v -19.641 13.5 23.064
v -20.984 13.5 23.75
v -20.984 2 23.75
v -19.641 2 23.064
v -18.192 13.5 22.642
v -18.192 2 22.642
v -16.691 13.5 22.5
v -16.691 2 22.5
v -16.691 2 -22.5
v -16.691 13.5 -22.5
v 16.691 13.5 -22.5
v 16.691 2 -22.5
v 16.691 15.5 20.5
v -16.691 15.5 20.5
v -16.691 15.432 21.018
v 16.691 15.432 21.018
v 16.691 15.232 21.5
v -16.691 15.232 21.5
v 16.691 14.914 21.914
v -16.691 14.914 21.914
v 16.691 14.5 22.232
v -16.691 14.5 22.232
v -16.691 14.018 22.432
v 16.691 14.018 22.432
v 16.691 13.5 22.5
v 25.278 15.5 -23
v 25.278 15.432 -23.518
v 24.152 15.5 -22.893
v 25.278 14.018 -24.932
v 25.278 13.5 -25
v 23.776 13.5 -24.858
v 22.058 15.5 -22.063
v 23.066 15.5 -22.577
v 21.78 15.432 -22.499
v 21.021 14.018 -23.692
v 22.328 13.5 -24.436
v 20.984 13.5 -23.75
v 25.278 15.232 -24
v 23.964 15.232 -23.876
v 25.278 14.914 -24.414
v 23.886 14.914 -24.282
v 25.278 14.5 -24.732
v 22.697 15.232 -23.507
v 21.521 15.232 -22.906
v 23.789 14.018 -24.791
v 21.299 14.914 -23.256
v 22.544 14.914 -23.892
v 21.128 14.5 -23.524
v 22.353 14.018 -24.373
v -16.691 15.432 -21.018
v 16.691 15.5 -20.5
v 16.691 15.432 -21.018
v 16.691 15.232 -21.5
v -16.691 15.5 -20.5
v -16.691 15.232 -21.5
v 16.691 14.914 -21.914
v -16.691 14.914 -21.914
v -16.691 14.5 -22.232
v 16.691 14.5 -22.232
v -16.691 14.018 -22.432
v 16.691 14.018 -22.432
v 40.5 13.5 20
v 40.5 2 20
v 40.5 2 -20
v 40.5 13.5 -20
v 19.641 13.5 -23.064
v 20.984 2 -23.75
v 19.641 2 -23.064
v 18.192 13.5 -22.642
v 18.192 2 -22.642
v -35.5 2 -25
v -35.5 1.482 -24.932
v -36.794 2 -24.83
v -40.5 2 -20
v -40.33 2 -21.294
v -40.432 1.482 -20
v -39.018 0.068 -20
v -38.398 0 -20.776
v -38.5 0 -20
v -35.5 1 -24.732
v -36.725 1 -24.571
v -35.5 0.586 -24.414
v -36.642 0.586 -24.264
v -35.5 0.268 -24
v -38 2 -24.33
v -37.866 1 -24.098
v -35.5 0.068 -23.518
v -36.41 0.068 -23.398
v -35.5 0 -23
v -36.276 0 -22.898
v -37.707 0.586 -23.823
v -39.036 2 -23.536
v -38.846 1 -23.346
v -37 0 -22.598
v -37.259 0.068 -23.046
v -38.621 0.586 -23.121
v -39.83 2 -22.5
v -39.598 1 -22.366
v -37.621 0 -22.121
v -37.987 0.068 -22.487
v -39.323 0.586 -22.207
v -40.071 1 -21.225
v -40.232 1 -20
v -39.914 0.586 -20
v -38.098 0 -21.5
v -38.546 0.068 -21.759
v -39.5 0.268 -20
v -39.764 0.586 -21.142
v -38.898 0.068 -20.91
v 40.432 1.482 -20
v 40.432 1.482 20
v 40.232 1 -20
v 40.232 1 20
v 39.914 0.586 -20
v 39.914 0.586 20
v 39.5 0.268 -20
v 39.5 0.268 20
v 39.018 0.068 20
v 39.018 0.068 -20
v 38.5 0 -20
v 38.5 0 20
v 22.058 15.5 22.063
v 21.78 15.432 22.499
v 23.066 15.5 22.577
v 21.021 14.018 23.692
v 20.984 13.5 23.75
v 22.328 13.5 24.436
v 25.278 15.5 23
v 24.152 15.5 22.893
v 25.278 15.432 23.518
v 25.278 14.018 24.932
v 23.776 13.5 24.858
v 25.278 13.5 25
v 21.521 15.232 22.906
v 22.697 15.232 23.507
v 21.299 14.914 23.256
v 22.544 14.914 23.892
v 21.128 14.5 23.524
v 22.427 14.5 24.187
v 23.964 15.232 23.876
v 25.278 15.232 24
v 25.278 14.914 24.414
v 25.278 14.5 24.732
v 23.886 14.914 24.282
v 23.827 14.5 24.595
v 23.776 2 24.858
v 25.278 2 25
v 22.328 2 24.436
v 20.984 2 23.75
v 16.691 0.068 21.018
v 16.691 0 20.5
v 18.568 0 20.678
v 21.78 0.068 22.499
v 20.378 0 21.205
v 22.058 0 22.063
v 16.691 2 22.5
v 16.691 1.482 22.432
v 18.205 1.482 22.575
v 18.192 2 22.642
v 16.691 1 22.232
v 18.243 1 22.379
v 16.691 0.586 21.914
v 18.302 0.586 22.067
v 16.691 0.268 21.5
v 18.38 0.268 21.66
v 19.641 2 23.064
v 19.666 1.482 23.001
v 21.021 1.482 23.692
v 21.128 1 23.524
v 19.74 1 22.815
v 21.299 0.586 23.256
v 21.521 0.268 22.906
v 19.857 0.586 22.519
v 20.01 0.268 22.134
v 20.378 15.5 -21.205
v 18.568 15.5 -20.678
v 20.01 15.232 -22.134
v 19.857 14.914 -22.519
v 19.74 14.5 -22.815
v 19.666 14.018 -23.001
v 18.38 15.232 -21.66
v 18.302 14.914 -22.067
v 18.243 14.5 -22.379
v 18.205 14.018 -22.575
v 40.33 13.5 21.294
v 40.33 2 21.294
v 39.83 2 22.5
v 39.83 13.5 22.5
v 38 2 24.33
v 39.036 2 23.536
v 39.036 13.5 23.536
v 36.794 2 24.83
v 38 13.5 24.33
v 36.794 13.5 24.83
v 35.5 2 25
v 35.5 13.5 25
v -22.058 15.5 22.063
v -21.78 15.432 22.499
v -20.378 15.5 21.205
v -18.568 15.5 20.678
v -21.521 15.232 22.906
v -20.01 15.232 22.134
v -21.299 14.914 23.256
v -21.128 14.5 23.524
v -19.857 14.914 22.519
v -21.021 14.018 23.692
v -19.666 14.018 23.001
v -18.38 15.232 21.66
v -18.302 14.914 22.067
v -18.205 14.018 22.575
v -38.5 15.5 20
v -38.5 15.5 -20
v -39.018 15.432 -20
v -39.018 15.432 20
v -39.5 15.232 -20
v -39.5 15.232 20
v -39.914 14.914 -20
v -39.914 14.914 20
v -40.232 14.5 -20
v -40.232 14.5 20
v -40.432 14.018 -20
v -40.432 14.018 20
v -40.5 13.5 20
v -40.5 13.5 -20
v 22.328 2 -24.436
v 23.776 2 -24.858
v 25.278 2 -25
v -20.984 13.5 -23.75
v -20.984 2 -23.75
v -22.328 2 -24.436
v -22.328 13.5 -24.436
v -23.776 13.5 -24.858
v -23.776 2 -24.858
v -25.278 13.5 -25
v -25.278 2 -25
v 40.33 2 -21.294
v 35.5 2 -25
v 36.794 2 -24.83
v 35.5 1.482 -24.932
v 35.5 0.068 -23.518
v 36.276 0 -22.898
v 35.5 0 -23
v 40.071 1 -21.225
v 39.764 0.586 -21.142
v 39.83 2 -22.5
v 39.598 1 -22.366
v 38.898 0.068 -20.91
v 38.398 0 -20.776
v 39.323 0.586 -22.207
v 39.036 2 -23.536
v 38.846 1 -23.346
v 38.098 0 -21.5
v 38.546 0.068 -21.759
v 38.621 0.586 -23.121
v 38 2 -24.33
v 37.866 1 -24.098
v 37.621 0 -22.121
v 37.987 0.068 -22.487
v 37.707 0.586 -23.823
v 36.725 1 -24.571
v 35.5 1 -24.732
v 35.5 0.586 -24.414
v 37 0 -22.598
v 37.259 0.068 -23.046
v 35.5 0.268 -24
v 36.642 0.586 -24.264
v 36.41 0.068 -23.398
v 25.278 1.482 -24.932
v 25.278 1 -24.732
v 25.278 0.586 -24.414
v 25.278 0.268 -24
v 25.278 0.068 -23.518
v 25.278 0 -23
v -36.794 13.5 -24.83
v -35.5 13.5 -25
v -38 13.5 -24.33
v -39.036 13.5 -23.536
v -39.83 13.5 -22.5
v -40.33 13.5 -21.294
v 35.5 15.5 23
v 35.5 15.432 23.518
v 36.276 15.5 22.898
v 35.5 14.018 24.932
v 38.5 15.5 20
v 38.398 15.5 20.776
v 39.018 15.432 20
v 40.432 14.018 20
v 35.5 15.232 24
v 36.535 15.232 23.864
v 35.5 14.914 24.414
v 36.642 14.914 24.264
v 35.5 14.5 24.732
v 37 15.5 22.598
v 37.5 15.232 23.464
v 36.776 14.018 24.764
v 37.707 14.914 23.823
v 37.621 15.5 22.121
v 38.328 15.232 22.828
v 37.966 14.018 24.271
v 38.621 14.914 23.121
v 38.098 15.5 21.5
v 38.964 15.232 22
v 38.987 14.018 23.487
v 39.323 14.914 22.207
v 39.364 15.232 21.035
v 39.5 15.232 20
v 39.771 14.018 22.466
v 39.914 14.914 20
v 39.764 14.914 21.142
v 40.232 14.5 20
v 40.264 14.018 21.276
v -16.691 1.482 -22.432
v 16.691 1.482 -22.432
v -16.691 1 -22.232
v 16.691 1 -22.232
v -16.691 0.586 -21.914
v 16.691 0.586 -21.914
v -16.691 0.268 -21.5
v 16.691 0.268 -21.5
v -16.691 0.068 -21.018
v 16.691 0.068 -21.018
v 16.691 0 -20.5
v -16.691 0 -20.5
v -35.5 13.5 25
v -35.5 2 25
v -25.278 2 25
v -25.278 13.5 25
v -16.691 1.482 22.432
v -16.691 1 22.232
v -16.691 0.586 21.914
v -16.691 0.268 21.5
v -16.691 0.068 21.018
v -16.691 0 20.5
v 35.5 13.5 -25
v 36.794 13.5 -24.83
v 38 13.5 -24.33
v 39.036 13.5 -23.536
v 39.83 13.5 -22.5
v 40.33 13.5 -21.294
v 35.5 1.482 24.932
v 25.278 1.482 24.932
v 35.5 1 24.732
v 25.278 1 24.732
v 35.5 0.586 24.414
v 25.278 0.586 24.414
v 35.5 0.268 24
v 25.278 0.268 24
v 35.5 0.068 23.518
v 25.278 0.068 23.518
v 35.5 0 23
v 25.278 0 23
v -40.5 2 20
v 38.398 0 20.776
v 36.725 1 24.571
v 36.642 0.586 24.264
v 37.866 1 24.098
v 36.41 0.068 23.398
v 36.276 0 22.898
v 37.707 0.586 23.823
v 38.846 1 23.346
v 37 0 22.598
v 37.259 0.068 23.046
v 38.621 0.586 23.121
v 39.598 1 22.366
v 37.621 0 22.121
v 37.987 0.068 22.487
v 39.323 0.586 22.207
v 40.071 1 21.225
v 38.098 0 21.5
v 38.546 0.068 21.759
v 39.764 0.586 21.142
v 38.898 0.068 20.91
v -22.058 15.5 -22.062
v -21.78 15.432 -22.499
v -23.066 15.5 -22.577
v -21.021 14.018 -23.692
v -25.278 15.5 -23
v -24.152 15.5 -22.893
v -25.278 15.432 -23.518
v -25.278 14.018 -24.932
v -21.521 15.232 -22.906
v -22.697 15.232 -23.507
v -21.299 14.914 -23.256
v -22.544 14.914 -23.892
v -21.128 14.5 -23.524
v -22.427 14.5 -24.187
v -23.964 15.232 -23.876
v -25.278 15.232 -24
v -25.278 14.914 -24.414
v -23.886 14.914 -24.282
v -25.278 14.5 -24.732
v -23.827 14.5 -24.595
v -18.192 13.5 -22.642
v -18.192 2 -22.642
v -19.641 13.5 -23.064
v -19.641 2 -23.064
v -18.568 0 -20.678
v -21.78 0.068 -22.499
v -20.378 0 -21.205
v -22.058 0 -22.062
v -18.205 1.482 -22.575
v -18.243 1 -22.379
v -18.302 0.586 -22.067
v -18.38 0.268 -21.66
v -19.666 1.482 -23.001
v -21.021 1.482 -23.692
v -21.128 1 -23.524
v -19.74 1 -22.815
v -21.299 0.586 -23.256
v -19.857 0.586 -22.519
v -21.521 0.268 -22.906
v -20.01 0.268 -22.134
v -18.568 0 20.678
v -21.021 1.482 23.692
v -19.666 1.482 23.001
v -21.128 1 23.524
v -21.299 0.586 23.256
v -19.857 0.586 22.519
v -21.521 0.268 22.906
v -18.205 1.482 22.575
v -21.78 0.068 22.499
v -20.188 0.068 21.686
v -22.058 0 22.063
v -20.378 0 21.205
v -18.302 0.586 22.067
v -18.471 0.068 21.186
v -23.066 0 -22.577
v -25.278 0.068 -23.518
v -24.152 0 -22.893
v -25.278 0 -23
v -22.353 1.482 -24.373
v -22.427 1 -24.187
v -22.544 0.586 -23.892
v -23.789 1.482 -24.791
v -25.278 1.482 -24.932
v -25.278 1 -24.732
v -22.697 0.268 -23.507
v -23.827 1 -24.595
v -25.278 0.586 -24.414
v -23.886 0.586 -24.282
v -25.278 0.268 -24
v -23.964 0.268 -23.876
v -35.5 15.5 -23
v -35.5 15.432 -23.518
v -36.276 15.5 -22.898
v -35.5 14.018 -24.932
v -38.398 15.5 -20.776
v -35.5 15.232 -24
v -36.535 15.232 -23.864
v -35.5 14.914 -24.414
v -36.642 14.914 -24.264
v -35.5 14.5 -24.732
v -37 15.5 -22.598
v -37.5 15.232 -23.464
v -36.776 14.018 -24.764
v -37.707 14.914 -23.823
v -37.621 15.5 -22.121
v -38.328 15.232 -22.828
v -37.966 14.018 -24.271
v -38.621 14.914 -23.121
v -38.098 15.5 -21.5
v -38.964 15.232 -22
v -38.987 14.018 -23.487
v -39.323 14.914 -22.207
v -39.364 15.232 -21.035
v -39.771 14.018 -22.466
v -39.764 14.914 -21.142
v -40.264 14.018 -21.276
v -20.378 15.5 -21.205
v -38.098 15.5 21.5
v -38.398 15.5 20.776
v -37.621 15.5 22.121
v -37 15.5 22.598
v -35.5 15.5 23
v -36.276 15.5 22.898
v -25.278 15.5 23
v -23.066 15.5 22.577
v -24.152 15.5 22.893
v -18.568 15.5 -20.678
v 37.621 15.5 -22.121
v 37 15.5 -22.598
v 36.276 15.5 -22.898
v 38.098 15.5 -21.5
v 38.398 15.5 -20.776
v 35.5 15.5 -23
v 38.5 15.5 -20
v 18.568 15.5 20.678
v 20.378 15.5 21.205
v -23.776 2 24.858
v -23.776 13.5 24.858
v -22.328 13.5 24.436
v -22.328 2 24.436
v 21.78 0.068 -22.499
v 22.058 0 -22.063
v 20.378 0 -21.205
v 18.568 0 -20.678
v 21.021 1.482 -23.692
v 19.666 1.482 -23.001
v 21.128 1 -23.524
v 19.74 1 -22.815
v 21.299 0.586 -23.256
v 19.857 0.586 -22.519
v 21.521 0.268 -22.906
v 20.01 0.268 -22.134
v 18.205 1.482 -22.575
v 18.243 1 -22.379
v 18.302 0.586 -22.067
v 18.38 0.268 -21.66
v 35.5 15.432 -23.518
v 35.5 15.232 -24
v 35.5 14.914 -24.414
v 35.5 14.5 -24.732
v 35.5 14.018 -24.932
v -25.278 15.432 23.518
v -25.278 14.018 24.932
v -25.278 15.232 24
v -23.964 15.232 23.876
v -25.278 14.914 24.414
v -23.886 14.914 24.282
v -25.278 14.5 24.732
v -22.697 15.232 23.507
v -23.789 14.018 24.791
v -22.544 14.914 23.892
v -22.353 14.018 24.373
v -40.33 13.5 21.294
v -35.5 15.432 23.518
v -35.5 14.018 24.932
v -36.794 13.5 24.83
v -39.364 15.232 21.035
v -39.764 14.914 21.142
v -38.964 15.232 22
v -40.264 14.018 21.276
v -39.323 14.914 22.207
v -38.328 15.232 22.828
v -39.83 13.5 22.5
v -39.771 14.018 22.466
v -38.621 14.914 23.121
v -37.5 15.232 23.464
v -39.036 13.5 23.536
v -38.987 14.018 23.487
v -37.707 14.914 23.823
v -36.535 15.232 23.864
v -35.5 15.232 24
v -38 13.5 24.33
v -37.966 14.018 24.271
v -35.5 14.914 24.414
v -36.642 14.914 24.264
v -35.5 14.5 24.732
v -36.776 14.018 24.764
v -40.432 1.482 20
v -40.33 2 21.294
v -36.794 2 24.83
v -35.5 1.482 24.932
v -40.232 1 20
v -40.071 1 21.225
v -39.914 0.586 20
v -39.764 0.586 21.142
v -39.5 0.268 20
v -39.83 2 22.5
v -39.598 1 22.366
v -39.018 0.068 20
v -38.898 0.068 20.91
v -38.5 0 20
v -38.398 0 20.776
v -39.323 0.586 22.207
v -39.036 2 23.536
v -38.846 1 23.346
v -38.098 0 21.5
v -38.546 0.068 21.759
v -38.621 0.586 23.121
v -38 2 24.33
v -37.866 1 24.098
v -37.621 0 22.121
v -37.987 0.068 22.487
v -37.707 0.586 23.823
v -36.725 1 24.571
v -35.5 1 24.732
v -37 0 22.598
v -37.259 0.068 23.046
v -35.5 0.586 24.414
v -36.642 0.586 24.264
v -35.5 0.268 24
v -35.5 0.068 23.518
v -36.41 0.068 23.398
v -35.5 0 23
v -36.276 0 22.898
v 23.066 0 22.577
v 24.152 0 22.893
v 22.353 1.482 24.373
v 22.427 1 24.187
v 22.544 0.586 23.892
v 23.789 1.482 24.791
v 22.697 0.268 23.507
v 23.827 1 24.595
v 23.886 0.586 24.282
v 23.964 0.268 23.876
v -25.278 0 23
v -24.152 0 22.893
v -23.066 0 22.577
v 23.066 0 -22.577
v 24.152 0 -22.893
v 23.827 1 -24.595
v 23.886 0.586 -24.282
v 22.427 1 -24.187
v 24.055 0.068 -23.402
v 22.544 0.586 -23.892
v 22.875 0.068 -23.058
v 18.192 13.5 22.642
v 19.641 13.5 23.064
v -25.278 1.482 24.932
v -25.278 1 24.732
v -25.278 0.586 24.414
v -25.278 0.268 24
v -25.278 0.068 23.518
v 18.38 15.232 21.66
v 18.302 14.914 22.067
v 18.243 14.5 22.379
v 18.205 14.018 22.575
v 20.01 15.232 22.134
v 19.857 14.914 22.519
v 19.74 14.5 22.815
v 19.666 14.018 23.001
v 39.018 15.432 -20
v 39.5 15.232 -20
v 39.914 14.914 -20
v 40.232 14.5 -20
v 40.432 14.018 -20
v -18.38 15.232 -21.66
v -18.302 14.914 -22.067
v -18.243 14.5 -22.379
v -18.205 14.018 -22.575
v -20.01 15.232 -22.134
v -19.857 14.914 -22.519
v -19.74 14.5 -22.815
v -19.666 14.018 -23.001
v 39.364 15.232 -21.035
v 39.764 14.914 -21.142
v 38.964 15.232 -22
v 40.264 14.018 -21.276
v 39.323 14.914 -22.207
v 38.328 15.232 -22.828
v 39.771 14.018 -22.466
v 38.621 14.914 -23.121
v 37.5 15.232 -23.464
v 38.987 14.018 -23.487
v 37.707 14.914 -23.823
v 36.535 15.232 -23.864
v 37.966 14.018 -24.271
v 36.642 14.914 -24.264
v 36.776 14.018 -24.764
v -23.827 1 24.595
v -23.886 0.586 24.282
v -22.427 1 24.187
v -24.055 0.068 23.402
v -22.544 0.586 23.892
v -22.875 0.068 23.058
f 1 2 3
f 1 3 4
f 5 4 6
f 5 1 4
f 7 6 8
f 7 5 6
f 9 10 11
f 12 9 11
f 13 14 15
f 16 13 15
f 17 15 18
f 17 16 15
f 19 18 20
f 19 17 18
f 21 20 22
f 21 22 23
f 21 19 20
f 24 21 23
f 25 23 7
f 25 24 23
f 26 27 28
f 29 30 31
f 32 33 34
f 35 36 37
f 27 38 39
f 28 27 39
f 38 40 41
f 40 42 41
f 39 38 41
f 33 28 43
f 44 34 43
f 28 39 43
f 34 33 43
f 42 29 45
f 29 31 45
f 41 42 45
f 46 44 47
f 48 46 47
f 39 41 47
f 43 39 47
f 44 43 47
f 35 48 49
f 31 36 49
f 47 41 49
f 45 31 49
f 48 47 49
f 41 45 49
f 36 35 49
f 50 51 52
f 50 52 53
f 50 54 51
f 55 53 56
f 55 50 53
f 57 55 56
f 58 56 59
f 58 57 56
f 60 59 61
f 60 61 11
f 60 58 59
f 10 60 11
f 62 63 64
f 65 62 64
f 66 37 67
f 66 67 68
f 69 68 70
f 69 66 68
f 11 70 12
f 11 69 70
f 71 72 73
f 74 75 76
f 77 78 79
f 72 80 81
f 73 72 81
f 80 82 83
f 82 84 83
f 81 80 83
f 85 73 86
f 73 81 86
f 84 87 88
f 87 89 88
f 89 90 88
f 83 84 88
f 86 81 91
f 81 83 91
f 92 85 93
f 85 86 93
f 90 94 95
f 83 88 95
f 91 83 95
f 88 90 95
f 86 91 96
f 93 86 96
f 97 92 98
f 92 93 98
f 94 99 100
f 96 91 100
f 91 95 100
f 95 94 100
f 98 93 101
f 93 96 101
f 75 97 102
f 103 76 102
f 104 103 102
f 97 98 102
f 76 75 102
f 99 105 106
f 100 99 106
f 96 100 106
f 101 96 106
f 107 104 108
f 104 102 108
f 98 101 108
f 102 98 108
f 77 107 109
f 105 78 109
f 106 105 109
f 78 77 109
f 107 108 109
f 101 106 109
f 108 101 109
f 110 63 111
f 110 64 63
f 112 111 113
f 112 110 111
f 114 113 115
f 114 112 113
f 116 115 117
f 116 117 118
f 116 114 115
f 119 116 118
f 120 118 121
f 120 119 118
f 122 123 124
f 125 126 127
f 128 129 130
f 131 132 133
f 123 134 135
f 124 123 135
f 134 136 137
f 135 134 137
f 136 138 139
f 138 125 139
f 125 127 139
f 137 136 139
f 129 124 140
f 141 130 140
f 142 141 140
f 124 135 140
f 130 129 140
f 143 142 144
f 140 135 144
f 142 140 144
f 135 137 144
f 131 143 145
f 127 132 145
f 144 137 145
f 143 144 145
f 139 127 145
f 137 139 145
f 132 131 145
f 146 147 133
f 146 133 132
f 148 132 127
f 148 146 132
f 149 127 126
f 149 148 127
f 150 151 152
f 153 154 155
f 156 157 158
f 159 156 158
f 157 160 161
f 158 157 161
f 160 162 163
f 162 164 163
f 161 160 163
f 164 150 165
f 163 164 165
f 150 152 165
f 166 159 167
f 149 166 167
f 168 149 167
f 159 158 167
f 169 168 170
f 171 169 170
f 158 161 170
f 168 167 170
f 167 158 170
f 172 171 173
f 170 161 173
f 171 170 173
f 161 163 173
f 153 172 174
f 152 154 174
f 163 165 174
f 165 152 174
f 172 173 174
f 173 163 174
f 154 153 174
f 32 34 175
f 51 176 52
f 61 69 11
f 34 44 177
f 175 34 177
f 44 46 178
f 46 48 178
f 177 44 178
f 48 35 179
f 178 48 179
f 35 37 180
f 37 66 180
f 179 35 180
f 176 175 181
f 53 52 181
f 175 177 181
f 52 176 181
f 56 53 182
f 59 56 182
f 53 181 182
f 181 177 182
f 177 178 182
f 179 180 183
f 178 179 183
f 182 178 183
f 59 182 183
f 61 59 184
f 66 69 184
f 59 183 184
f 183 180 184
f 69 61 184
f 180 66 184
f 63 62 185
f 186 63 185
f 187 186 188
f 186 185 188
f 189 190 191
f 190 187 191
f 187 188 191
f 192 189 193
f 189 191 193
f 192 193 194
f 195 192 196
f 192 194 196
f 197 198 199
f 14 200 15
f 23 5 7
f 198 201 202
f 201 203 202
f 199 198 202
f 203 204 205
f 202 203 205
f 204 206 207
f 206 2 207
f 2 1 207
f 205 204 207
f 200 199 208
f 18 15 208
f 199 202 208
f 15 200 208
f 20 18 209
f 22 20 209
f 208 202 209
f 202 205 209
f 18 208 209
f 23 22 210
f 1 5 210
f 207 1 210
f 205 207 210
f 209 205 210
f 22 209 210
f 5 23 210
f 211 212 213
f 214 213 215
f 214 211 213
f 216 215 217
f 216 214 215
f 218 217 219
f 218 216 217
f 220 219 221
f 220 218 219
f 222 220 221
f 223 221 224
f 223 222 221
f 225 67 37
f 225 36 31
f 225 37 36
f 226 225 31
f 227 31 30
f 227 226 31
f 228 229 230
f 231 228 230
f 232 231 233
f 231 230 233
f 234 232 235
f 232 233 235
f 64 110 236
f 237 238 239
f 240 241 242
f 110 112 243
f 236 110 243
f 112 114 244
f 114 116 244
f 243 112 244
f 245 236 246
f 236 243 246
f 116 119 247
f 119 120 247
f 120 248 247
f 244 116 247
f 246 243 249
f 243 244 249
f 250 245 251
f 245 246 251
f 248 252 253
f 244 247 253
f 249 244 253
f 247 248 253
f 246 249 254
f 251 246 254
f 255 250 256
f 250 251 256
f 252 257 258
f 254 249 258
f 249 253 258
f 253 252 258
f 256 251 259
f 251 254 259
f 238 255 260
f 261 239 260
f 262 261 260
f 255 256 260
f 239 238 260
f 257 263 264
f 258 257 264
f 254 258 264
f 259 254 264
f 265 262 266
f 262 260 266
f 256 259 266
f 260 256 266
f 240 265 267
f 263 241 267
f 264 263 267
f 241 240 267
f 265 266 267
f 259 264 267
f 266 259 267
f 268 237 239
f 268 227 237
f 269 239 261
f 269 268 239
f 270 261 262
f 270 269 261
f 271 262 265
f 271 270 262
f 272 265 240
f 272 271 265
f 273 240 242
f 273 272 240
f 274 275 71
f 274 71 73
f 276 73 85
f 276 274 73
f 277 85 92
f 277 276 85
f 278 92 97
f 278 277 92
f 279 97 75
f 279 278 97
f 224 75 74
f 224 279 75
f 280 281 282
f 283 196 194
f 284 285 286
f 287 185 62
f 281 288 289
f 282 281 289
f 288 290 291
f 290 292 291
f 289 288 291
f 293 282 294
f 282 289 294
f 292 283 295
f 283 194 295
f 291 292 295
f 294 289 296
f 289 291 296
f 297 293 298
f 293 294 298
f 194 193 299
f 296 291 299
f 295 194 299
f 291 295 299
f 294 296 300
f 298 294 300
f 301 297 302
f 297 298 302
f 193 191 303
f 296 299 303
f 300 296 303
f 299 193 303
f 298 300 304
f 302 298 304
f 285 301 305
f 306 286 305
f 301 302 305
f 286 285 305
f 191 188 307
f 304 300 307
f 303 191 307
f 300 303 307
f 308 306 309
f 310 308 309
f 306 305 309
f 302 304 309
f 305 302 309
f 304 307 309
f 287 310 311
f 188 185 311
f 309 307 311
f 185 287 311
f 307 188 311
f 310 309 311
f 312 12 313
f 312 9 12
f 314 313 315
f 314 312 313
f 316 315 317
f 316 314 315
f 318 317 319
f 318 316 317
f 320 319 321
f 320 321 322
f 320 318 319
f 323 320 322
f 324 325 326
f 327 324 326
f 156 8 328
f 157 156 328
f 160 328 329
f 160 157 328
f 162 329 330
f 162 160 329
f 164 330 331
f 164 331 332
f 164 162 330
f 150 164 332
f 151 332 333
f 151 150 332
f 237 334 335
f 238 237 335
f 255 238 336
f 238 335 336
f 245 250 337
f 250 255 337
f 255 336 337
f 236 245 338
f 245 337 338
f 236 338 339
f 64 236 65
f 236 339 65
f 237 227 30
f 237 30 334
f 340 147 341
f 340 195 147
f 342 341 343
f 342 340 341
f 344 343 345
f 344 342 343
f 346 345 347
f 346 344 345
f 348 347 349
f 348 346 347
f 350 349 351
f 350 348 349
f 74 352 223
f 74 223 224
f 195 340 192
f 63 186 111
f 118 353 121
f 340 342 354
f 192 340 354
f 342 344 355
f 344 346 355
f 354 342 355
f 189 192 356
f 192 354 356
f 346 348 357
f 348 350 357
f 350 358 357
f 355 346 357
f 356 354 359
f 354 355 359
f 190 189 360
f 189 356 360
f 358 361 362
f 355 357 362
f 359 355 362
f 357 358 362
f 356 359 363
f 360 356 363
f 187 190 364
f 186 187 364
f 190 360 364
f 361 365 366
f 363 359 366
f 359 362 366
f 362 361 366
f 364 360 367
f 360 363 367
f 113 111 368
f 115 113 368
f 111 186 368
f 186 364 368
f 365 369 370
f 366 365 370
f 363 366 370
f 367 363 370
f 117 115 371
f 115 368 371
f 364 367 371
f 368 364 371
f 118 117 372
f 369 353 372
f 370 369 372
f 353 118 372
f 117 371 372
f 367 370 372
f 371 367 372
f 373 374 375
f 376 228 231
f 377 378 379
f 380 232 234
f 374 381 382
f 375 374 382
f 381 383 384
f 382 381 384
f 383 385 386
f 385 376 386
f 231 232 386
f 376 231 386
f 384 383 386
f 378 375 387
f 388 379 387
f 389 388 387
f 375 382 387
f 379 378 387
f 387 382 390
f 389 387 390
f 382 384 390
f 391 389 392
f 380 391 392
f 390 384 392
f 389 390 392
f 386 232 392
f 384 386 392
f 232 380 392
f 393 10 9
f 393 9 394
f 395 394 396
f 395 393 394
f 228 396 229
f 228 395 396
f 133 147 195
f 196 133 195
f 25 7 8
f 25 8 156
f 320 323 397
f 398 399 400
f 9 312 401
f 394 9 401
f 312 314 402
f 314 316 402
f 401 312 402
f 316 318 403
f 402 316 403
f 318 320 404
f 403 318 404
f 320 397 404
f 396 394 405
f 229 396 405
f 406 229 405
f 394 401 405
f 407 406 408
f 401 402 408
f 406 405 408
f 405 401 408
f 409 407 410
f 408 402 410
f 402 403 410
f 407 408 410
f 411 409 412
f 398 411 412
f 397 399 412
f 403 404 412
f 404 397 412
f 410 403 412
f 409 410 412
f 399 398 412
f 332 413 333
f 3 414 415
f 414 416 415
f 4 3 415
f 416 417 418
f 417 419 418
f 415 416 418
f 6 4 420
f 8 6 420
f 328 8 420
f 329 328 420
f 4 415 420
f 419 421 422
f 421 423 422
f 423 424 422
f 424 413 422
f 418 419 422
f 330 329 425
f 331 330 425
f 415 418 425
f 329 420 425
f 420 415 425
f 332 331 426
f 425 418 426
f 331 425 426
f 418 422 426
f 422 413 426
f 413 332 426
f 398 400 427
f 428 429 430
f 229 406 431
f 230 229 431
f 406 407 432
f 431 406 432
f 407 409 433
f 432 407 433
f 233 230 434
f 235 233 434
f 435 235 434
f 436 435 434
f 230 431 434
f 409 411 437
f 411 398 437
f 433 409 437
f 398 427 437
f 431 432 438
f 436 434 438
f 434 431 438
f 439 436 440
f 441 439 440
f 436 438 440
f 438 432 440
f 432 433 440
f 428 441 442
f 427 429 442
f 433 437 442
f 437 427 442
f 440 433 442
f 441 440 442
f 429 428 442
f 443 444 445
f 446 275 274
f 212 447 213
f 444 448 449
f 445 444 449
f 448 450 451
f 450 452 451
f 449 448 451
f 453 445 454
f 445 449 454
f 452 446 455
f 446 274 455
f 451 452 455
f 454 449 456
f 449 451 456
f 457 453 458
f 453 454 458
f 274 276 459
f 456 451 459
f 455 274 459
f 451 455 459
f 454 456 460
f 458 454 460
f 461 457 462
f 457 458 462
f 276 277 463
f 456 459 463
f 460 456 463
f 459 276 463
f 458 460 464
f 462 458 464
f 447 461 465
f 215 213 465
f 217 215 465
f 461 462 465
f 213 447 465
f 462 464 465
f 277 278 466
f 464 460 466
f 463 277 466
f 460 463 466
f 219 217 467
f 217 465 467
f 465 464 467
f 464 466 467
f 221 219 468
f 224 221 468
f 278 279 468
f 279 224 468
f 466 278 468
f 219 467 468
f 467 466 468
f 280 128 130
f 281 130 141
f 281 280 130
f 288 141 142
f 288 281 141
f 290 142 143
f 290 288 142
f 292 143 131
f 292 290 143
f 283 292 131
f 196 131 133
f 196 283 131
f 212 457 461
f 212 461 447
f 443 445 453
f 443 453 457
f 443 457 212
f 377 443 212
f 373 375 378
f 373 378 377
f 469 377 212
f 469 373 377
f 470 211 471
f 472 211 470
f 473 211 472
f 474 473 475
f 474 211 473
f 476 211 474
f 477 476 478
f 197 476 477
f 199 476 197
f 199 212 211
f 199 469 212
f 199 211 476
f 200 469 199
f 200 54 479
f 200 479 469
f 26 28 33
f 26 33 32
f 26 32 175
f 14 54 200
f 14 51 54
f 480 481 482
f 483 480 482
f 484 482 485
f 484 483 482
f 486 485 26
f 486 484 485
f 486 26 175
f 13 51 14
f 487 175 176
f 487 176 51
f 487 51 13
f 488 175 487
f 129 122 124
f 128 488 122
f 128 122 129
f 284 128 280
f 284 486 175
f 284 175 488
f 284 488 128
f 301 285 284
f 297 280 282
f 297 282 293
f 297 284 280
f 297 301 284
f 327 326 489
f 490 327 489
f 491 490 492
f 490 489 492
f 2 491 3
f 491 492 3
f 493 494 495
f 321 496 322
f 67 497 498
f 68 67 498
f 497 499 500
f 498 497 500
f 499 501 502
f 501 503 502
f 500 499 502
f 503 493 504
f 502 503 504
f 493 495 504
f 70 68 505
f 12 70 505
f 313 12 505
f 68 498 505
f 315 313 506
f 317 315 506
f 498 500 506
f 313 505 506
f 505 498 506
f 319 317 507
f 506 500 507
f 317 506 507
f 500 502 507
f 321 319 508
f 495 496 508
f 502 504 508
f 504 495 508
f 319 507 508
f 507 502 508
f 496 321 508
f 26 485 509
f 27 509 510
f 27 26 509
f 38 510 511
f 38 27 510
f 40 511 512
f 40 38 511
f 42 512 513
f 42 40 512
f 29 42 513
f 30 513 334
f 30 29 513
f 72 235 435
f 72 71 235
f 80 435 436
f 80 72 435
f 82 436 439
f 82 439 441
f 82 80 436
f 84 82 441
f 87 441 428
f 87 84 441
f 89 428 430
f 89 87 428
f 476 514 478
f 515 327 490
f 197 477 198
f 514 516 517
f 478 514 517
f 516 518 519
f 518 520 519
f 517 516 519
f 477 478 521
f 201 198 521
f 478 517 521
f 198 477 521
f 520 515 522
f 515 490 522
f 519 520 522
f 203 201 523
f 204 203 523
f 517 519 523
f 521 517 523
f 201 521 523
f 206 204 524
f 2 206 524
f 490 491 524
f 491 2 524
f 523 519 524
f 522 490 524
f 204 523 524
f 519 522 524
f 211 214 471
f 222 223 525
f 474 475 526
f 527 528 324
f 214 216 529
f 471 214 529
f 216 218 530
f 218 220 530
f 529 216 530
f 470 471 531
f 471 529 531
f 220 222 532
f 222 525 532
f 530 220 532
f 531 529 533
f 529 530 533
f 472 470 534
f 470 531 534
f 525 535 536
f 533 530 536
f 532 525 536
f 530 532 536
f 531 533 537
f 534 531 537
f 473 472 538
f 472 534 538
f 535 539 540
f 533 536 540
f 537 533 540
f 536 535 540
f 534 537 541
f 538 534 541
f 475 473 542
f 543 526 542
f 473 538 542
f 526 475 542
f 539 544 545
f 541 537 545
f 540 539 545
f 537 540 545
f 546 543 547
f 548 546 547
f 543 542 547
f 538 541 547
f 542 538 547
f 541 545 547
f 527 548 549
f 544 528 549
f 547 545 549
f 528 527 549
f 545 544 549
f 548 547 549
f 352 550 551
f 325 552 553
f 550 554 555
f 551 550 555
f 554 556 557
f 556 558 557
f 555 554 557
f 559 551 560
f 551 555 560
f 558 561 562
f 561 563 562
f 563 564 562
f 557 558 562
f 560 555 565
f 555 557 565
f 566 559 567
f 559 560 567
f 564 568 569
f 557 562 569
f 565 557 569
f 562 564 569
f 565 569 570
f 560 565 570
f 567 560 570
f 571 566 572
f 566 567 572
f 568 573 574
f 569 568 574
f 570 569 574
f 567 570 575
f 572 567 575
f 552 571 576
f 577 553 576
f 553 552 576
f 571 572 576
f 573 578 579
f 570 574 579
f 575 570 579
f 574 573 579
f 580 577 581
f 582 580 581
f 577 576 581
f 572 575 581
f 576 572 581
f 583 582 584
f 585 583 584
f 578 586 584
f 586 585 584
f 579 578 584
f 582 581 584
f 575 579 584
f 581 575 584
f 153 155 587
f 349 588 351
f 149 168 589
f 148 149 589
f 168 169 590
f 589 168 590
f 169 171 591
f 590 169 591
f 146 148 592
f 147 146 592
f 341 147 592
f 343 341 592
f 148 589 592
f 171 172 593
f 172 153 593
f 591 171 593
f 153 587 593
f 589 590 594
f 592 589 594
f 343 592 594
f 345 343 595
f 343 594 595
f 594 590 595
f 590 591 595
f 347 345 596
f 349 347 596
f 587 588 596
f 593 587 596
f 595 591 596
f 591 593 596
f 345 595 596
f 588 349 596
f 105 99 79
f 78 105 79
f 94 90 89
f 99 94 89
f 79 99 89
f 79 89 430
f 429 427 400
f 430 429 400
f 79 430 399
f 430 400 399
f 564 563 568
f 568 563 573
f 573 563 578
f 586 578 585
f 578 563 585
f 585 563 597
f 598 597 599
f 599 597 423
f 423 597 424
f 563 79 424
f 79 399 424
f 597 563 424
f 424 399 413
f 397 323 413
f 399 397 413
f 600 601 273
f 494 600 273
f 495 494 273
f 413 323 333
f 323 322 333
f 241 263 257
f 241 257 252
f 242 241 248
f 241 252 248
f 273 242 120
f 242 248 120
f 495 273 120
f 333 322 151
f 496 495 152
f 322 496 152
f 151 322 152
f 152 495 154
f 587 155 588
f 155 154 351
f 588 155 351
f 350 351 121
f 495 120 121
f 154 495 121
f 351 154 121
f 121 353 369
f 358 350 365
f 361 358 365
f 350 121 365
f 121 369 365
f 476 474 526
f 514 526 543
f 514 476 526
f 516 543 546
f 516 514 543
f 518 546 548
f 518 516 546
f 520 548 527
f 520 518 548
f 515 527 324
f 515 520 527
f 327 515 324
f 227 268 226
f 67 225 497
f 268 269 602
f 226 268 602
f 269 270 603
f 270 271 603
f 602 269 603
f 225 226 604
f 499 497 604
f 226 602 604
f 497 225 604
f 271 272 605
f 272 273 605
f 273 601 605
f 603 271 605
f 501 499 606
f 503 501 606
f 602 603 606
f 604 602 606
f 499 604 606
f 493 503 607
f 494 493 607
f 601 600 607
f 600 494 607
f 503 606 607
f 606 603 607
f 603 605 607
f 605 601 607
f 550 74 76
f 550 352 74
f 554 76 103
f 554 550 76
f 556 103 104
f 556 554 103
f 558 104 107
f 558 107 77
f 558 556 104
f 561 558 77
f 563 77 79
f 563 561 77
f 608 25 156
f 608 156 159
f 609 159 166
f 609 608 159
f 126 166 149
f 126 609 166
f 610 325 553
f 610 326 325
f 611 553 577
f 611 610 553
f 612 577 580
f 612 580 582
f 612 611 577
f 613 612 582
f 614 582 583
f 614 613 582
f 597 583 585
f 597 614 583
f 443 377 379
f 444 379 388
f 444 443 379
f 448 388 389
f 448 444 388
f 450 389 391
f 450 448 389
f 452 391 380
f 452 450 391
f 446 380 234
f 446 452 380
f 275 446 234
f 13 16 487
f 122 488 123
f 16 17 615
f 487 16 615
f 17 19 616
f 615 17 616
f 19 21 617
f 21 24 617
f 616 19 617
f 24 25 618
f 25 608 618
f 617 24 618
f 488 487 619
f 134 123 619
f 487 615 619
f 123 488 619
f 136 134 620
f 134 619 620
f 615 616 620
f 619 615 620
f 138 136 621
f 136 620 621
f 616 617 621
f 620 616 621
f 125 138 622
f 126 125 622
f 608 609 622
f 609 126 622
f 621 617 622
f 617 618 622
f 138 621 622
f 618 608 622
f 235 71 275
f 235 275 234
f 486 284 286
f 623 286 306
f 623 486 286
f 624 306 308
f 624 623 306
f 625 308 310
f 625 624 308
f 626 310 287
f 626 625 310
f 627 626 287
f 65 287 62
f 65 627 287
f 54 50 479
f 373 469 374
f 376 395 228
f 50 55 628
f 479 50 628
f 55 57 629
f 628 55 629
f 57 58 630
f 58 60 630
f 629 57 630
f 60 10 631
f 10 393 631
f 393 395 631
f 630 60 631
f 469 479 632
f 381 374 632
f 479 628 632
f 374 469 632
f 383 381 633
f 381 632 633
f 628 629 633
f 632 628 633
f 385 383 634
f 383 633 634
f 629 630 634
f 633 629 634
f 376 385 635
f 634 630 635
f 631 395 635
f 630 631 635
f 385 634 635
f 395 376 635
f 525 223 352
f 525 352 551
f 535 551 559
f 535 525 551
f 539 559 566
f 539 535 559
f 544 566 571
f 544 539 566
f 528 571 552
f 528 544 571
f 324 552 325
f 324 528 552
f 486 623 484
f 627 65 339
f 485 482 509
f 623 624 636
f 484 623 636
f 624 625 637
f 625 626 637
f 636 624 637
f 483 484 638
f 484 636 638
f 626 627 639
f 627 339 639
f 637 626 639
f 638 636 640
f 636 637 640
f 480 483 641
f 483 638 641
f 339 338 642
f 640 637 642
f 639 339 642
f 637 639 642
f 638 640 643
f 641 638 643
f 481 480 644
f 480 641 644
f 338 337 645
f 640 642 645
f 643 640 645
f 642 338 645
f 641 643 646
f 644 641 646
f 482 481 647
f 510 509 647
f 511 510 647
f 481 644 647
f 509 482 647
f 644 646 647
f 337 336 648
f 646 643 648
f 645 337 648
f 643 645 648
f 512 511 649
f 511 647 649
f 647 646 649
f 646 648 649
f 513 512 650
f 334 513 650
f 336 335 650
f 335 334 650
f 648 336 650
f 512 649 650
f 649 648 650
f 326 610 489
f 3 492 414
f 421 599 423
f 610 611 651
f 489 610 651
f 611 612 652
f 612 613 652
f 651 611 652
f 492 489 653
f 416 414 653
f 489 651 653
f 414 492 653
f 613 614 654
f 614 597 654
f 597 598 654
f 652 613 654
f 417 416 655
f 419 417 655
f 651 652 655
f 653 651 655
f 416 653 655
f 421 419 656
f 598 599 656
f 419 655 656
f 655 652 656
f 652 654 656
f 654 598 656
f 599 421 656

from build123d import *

# Parameters (mm, degrees)
SKETCH1_W           = 81
SKETCH1_H           = 50
BOSS_EXTRUDE1_DEPTH = 15.5
SKETCH2_W           = 45
SKETCH2_H           = 2.5
CUT_EXTRUDE1_DEPTH  = 51.054969783
FILLET1_R           = 8
FILLET2_R           = 8
FILLET3_R           = 5
FILLET4_R           = 2


with BuildPart() as part:
    # Sketch1 → Boss-Extrude1 (new body)
    with BuildSketch(Plane(origin=(0, 0, 0), x_dir=(1, 0, 0), z_dir=(0, 1, 0))):
        Rectangle(SKETCH1_W, SKETCH1_H)
    extrude(amount=BOSS_EXTRUDE1_DEPTH)

    # Sketch2 → Cut-Extrude1 (cut, through all)
    with BuildSketch(Plane(origin=(0, 15.5, 0), x_dir=(1, 0, 0), z_dir=(0, 1, 0))):
        with Locations((0, 23.75)):
            Rectangle(SKETCH2_W, SKETCH2_H)
        with Locations((0, -23.75)):
            Rectangle(SKETCH2_W, SKETCH2_H)
    extrude(amount=-CUT_EXTRUDE1_DEPTH, mode=Mode.SUBTRACT)

    # Fillet1
    # the kernel refuses this fillet: 8 mm, written as the material it adds along each edge
    with BuildSketch(Plane(origin=(22.5, 15.5, 22.5), x_dir=(-1, 0, 0), z_dir=(0, -1, 0))) as fillet1_piece_1:
        with BuildLine():
            CenterArc((5.809475019, -8), FILLET1_R, 90, 46.567463442)
            Line((0, -2.5), (-0.1161895, -2.39))
            ThreePointArc((-0.1161895, -2.39), (-0.16, -1.25), (-0.16, 0))
            Line((-0.16, 0), (0, 0.16))
            Line((0, 0.16), (5.809475019, 0.16))
            Line((5.809475019, 0.16), (5.809475019, 0))
        make_face()
    extrude(amount=15.5)
    with BuildSketch(Plane(origin=(-22.5, 15.5, 22.5), x_dir=(0, 0, 1), z_dir=(0, -1, 0)), Plane(origin=(22.5, 15.5, -22.5), x_dir=(0, 0, -1), z_dir=(0, -1, 0))) as fillet1_piece_2:
        with BuildLine():
            CenterArc((8, -5.809475019), FILLET1_R, 133.432536558, 46.567463442)
            Line((0, -5.809475019), (-0.16, -5.809475019))
            Line((-0.16, -5.809475019), (-0.16, 0))
            Line((-0.16, 0), (0, 0.16))
            ThreePointArc((0, 0.16), (1.25, 0.16), (2.39, 0.1161895))
            Line((2.39, 0.1161895), (2.5, 0))
        make_face()
    extrude(amount=15.5)
    with BuildSketch(Plane(origin=(-22.5, 15.5, -22.5), x_dir=(0, 0, -1), z_dir=(0, -1, 0))) as fillet1_piece_3:
        with BuildLine():
            CenterArc((8, 5.809475019), FILLET1_R, 180, 46.567463442)
            Line((0, 5.809475019), (-0.16, 5.809475019))
            Line((-0.16, 5.809475019), (-0.16, 0))
            Line((-0.16, 0), (0, -0.16))
            ThreePointArc((0, -0.16), (1.25, -0.16), (2.39, -0.1161895))
            Line((2.39, -0.1161895), (2.5, 0))
        make_face()
    extrude(amount=15.5)

    # Fillet2
    fillet2_edges = [part.edges().sort_by_distance(p)[0] for p in [
        (22.5, 7.75, -25),
        (-22.5, 7.75, -25),
        (22.5, 7.75, 25),
        (-22.5, 7.75, 25),
    ]]
    fillet(fillet2_edges, radius=FILLET2_R)

    # Fillet3
    fillet3_edges = [part.edges().sort_by_distance(p)[0] for p in [
        (-40.5, 7.75, -25),
        (40.5, 7.75, -25),
        (40.5, 7.75, 25),
        (-40.5, 7.75, 25),
    ]]
    fillet(fillet3_edges, radius=FILLET3_R)

    # Fillet4
    fillet4_edges = [part.edges().sort_by_distance(p)[0] for p in [
        (0, 15.5, 22.5),
        (0, 0, 22.5),
        (0, 15.5, -22.5),
        (0, 0, -22.5),
        (18.926592958, 15.5, 22.818854252),
        (-18.926592958, 0, 22.818854252),
        (-18.926592958, 15.5, -22.818854252),
        (18.926592958, 0, -22.818854252),
        (-18.926592958, 15.5, 22.818854252),
        (30.3891535, 15.5, 25),
        (18.926592958, 15.5, -22.818854252),
        (-30.3891535, 15.5, -25),
        (23.042239022, 15.5, 24.681145748),
        (-23.042239022, 15.5, 24.681145748),
        (-23.042239022, 15.5, -24.681145748),
        (23.042239022, 15.5, -24.681145748),
        (30.3891535, 0, 25),
        (18.926592958, 0, 22.818854252),
        (-30.3891535, 0, -25),
        (-18.926592958, 0, -22.818854252),
        (23.042239022, 0, 24.681145748),
        (-23.042239022, 0, 24.681145748),
        (-23.042239022, 0, -24.681145748),
        (23.042239022, 0, -24.681145748),
        (30.3891535, 0, -25),
        (30.3891535, 15.5, -25),
        (40.5, 0, 0),
        (-30.3891535, 0, 25),
        (-40.5, 0, 0),
        (-39.035533906, 0, -23.535533906),
        (-39.035533906, 0, 23.535533906),
        (39.035533906, 0, 23.535533906),
        (39.035533906, 0, -23.535533906),
        (40.5, 15.5, 0),
        (-40.5, 15.5, 0),
        (-30.3891535, 15.5, 25),
        (-39.035533906, 15.5, -23.535533906),
        (-39.035533906, 15.5, 23.535533906),
        (39.035533906, 15.5, 23.535533906),
        (39.035533906, 15.5, -23.535533906),
    ]]
    fillet(fillet4_edges, radius=FILLET4_R)


solid = part.part
